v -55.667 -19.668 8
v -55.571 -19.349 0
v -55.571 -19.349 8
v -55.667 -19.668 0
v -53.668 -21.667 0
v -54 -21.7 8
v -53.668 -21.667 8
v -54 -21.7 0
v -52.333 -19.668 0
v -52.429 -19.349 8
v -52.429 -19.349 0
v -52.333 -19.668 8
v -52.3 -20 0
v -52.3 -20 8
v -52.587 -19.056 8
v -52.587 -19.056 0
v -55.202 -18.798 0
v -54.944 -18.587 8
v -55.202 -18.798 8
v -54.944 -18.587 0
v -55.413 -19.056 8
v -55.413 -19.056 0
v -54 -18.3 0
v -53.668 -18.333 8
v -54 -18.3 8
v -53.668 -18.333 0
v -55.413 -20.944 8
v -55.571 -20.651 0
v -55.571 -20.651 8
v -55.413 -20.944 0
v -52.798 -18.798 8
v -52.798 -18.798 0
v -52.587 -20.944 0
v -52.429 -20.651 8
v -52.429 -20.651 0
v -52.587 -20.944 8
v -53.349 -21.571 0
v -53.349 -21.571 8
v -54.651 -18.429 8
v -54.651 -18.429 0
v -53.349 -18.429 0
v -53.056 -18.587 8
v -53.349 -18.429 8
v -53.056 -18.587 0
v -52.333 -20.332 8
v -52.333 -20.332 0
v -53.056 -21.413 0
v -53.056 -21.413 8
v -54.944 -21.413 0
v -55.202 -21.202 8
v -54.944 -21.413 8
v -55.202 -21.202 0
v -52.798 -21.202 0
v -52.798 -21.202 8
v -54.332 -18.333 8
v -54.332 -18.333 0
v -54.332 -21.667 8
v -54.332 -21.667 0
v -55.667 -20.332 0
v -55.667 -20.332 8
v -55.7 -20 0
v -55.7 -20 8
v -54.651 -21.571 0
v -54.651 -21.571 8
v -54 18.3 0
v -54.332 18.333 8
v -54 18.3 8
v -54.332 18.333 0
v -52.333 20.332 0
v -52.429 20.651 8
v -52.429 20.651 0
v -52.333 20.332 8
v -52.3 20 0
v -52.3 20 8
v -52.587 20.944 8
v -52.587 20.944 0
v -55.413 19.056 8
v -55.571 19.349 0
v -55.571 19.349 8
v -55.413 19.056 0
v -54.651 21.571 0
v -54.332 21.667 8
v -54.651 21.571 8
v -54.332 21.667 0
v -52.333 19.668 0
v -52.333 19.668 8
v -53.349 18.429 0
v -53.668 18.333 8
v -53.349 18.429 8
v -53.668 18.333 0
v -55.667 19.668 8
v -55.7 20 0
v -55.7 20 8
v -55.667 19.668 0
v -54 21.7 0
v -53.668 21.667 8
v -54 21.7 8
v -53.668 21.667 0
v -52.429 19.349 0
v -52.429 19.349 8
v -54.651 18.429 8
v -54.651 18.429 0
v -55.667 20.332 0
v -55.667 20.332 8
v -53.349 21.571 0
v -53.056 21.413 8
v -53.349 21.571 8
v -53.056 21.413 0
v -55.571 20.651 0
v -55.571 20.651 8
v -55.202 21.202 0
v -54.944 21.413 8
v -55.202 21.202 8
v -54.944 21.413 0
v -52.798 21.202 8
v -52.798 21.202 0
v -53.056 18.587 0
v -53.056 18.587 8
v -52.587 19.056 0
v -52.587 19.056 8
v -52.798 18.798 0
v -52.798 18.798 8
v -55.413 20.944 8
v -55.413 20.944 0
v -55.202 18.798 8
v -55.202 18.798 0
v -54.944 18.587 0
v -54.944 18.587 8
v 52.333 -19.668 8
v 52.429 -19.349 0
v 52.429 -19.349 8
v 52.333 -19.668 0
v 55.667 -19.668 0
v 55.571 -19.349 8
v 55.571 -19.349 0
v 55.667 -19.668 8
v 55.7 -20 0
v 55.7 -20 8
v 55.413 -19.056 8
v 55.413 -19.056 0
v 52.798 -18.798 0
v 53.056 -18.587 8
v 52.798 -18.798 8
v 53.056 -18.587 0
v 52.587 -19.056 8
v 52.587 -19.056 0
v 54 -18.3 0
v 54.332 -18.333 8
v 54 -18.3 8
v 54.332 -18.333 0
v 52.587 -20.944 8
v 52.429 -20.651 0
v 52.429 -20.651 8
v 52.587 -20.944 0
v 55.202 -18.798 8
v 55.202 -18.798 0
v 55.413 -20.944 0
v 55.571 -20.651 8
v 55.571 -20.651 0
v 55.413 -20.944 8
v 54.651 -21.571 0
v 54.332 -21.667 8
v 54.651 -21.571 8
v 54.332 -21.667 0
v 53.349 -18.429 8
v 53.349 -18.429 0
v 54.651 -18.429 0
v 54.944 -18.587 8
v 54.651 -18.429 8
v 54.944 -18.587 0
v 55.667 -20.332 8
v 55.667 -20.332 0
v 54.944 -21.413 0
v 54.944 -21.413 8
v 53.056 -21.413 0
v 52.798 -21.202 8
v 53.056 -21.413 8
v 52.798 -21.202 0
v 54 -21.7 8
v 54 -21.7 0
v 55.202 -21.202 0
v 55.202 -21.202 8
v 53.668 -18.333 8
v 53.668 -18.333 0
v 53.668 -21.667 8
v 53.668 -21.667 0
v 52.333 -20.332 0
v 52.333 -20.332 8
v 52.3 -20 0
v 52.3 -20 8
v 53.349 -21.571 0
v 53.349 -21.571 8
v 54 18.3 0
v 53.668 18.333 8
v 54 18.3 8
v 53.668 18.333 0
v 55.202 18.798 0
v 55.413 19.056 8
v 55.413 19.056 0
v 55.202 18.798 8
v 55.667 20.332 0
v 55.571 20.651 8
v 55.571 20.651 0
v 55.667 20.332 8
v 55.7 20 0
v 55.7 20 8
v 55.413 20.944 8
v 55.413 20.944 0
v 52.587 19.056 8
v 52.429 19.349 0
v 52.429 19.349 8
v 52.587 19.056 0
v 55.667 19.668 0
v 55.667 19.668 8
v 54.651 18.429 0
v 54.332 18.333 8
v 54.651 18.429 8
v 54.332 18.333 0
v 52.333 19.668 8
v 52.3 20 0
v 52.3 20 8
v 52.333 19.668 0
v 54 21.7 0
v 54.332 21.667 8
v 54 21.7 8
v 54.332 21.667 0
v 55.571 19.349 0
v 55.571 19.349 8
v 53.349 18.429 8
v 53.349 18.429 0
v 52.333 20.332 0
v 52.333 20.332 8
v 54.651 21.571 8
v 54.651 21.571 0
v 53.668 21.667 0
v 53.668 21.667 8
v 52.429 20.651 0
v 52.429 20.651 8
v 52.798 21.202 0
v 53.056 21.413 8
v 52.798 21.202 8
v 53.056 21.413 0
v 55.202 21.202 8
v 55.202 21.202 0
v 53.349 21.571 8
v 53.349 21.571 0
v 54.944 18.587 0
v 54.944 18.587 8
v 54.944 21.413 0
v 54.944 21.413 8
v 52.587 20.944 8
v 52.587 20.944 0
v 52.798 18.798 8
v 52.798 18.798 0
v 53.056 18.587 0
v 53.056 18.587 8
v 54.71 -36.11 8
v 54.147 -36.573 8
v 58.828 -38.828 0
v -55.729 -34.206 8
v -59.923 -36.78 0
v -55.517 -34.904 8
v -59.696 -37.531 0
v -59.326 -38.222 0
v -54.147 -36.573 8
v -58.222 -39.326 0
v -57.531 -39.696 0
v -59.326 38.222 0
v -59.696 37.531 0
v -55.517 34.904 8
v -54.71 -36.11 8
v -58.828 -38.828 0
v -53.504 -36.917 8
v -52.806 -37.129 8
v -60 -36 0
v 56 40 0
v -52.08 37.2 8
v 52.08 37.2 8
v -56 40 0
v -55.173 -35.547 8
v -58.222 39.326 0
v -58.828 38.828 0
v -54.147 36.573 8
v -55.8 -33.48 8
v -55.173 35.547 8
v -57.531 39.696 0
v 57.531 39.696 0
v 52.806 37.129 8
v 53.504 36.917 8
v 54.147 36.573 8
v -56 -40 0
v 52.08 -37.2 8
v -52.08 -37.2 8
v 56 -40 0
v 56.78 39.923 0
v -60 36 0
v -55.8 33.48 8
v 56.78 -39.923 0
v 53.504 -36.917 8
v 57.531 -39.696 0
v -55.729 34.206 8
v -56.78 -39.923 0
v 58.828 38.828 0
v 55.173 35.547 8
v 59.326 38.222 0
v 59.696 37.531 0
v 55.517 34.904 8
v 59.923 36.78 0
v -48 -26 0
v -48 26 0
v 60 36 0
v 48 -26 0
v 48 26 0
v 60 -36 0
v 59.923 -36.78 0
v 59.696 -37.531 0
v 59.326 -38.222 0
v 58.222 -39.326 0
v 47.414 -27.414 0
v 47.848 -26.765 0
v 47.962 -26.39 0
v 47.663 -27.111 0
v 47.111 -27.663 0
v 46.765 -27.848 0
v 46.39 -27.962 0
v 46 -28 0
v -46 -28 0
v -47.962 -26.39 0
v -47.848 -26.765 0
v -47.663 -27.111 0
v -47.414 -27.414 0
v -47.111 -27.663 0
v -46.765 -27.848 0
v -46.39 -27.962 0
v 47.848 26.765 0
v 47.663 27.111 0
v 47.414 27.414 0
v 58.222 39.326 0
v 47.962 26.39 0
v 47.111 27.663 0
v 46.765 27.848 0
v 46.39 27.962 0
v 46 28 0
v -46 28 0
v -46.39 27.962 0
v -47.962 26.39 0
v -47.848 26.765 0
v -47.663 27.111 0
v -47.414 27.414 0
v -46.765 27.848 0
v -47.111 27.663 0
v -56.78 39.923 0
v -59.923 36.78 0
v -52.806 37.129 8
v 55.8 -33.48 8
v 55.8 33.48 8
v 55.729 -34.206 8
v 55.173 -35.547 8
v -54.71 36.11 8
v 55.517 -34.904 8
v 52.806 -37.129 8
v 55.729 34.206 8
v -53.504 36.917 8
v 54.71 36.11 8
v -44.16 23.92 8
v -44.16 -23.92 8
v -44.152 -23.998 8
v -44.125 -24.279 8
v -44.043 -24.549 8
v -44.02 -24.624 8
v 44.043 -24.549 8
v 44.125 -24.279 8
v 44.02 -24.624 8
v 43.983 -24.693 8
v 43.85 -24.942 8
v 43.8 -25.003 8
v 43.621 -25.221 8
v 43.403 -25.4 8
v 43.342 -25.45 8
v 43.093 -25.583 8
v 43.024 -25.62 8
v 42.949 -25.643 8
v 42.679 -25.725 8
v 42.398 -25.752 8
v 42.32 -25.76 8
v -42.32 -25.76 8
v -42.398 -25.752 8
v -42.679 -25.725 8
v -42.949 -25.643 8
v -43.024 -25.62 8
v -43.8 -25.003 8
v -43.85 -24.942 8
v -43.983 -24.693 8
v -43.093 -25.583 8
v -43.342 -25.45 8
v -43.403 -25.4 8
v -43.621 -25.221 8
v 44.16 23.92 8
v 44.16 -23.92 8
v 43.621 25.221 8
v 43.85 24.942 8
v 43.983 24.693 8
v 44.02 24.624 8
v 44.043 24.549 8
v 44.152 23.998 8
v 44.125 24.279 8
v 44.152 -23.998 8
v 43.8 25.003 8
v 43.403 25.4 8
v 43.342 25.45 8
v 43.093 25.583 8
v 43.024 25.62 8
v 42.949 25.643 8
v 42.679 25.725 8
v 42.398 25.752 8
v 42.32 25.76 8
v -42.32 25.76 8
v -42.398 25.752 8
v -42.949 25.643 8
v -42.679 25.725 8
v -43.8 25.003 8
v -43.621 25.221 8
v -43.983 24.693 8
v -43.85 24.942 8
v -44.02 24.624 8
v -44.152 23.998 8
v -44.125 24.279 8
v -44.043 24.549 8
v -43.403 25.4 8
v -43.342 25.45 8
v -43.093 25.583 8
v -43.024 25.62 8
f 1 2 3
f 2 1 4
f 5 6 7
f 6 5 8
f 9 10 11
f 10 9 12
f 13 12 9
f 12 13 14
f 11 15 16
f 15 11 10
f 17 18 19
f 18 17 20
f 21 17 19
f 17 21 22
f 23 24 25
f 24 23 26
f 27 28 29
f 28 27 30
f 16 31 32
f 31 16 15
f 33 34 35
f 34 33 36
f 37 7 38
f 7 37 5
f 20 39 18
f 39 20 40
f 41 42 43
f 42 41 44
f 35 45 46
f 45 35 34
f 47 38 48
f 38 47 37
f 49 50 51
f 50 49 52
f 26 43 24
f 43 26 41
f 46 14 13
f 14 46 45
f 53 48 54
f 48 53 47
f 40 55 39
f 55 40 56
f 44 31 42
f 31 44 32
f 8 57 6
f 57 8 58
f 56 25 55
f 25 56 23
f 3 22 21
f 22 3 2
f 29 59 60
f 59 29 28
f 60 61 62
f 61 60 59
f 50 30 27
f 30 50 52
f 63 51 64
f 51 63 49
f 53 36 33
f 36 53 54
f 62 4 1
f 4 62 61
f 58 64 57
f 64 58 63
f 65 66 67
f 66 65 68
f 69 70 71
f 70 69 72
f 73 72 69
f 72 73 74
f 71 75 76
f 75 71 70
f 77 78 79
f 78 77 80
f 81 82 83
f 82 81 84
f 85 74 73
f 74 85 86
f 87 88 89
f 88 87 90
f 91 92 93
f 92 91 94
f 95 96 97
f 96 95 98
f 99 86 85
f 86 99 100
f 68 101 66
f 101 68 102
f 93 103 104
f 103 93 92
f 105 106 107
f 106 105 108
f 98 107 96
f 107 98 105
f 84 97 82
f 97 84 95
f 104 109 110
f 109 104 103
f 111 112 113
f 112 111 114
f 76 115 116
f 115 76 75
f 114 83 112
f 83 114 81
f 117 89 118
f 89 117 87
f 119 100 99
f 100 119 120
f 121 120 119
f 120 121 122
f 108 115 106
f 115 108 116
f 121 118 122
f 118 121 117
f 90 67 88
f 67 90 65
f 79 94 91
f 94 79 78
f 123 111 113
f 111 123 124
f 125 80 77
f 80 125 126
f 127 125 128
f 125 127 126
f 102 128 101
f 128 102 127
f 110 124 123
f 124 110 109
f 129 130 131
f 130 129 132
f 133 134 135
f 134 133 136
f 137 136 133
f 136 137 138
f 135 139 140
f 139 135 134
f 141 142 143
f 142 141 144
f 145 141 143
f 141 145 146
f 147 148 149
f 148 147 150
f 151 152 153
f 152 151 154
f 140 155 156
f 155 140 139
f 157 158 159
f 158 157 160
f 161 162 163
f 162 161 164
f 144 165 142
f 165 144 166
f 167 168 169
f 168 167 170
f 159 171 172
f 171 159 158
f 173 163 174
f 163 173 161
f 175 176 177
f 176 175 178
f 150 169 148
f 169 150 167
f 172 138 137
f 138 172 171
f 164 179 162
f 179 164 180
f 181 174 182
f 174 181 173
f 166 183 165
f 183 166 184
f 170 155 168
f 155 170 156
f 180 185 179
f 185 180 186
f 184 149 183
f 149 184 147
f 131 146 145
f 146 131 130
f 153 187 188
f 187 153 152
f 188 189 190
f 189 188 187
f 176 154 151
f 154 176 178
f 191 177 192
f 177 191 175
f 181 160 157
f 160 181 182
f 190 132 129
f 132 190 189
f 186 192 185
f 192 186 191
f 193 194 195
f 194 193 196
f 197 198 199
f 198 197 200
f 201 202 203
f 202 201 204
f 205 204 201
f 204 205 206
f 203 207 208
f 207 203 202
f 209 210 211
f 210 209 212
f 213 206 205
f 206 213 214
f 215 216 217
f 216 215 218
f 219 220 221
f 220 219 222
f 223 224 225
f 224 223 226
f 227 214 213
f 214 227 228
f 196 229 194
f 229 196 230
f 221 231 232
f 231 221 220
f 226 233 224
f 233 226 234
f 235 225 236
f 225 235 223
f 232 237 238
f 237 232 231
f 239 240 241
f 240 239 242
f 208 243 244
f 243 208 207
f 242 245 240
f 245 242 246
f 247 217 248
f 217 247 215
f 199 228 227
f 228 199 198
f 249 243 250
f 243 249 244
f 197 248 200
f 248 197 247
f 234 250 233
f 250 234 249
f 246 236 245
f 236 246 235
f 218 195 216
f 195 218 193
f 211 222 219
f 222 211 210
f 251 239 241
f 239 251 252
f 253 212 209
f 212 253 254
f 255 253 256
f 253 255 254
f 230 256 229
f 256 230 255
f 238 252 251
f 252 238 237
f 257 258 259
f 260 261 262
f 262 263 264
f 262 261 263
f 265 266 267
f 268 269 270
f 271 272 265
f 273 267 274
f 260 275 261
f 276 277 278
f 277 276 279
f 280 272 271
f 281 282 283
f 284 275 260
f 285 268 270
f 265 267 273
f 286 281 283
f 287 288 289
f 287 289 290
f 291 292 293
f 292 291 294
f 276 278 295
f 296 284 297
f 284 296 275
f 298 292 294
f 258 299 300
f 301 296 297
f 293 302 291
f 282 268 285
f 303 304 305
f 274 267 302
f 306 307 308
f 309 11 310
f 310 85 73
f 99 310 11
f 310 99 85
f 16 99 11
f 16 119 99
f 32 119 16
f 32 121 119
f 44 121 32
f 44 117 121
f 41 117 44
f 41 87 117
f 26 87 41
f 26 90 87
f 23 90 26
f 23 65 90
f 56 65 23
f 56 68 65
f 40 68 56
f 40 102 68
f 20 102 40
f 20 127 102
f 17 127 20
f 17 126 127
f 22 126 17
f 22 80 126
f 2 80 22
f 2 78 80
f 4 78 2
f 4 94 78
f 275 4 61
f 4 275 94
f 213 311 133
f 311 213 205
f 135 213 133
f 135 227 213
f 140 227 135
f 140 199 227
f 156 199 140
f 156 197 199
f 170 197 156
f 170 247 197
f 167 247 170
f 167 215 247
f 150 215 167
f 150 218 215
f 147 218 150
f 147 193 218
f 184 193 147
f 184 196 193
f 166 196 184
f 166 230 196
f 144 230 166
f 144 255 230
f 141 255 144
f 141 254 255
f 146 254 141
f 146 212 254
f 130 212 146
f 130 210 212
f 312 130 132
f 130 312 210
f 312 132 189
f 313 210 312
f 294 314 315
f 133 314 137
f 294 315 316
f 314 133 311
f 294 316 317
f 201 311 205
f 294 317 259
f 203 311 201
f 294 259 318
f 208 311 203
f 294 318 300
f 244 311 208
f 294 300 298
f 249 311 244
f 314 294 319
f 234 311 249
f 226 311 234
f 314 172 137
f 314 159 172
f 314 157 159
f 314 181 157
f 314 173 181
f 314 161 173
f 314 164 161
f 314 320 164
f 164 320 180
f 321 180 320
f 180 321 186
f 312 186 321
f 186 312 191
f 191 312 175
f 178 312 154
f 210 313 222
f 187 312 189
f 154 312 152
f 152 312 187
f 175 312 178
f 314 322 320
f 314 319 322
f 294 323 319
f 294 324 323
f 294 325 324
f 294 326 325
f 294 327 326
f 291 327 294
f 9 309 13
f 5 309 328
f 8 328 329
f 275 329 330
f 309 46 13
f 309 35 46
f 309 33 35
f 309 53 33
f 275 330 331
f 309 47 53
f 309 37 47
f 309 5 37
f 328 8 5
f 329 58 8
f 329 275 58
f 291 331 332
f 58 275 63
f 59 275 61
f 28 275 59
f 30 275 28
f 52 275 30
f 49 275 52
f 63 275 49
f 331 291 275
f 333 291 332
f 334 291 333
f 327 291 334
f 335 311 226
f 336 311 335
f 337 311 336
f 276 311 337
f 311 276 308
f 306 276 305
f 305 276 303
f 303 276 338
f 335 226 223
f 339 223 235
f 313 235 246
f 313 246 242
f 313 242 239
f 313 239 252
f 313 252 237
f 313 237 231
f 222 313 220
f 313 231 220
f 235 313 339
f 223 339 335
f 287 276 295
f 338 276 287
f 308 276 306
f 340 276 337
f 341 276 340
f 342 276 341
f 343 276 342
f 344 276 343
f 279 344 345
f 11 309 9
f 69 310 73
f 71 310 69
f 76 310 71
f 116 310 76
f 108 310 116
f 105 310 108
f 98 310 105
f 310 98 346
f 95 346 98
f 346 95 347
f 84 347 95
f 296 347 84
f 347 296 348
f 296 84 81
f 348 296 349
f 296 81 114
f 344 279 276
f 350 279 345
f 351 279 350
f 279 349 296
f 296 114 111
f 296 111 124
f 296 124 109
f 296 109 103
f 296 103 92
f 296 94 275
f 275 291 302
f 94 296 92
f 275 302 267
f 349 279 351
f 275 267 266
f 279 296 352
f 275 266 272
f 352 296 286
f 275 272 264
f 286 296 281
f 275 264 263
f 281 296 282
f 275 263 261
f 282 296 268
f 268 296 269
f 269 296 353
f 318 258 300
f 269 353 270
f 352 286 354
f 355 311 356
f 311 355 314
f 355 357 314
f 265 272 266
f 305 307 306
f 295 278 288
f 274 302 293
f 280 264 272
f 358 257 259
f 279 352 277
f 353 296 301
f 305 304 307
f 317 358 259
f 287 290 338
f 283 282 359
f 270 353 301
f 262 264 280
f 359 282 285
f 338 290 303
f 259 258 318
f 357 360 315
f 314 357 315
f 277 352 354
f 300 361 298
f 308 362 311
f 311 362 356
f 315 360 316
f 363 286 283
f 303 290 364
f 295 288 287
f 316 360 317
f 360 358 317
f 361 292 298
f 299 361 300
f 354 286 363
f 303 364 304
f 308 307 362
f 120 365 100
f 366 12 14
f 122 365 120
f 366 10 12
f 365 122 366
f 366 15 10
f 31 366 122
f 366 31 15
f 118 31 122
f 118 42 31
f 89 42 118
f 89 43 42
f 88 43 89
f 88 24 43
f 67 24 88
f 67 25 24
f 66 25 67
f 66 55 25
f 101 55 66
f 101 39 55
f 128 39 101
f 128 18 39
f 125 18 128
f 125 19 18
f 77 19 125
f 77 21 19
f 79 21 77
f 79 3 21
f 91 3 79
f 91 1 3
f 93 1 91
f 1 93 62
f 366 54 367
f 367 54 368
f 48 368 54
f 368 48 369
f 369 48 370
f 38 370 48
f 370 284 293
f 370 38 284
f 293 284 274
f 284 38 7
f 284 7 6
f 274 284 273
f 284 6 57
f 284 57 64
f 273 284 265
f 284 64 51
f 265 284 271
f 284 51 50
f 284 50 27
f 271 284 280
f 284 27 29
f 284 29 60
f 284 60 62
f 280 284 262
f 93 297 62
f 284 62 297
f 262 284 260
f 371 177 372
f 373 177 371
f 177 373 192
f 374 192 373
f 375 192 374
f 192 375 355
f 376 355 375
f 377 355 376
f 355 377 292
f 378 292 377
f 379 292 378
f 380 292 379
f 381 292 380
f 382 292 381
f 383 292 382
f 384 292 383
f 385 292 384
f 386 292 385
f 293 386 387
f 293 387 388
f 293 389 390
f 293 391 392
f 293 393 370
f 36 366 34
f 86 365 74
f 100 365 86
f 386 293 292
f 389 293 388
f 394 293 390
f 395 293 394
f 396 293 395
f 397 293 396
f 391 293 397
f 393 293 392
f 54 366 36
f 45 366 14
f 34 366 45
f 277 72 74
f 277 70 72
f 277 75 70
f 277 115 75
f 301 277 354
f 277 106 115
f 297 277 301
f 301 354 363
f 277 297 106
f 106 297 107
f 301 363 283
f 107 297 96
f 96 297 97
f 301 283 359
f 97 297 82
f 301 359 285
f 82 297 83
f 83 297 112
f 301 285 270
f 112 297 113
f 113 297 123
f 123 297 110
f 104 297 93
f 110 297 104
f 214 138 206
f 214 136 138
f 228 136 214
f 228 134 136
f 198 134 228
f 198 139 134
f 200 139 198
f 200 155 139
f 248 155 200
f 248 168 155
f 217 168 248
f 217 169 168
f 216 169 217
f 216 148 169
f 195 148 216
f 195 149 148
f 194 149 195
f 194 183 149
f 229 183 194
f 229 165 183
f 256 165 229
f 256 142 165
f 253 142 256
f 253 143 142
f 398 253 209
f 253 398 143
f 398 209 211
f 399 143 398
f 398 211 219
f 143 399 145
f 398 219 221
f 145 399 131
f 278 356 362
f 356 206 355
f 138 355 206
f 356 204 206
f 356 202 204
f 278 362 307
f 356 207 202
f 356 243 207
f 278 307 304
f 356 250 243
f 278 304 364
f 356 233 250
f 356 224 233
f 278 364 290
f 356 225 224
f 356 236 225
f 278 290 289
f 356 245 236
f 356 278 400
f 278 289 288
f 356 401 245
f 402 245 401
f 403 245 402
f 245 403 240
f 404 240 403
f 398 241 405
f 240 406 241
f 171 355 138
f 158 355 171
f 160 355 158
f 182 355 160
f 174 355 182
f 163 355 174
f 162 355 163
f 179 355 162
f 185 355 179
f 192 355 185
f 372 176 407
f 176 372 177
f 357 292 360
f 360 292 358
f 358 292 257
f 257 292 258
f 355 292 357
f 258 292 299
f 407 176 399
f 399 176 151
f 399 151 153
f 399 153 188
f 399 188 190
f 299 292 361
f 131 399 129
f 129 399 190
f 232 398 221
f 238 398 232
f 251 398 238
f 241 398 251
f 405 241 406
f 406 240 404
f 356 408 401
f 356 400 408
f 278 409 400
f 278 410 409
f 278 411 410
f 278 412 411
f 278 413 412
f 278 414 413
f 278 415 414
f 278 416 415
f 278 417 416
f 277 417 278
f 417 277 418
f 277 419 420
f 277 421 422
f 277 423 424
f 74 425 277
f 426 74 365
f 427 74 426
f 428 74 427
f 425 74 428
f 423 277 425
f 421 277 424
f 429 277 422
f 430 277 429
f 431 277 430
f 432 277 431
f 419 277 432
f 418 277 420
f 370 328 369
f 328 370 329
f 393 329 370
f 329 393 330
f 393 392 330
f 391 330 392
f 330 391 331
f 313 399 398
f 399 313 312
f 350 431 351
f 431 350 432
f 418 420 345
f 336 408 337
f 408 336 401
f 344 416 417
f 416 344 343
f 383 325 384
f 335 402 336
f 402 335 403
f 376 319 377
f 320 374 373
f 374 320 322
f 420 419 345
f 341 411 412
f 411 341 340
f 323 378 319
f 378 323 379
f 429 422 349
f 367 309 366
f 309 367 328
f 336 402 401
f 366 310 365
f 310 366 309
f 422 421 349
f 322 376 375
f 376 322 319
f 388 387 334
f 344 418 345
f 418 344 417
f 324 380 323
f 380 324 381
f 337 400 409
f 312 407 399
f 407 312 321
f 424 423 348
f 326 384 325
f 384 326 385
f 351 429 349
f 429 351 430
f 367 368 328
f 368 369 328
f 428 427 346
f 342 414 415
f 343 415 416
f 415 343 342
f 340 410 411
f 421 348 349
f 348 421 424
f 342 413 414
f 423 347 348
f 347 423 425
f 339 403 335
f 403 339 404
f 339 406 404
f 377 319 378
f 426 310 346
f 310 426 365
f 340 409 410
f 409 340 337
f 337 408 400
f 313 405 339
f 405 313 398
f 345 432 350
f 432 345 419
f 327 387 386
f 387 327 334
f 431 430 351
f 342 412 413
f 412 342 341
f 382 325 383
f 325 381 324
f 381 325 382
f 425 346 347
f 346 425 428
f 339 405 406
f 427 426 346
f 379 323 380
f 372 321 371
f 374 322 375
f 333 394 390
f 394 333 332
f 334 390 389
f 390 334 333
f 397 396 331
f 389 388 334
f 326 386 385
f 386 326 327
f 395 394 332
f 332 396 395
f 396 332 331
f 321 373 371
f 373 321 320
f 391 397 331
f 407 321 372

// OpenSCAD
$fn = 32;

// ----------------------------------------------------------------------
// Display bezel: 120 x 80 mm frame, opening 96x56 mm
// ----------------------------------------------------------------------

// --- parameters (mm) ---
length = 120;             // frame outside length, X
width = 80;               // frame outside width, Y
frame_w = 12;             // frame width
thickness = 8;            // frame thickness
corner_r = 4;             // outside corner radius
chamfer = 0.93;           // outer wall taper
funnel = 0.9;             // inner opening taper
opening_l = 96;           // opening length
opening_w = 56;           // opening width
inner_r = 2;              // opening corner radius
hole_d = 3.4;             // mounting screw clearance
holes_per_side = 2;       // holes per short side
hole_inset = 6;           // hole centre inset from the outside edge

/* rounded-rectangle outlines, generated with loops */
module rounded_ring(l_nom, w_nom, r) {
  hull() {
    for (sx = [-1, 1]) for (sy = [-1, 1])
      translate([sx * (l_nom / 2 - r), sy * (w_nom / 2 - r)]) circle(r = r);
  }
}

difference() {
  /* frame body, drafted so the outer edge is a variable-depth chamfer */
  linear_extrude(height = thickness, scale = chamfer)
    rounded_ring(length, width, corner_r);
  /* viewing opening, drafted the other way for a funnel edge */
  linear_extrude(height = thickness + 2, scale = funnel)
    translate([0, 0, -1]) rounded_ring(opening_l, opening_w, inner_r);
  /* mounting screws through the frame lands */
  for (sx = [-1, 1]) for (i = [1 : holes_per_side])
    translate([sx * (length / 2 - hole_inset),
               (i - (holes_per_side + 1) / 2) * width * 0.5, -1])
      cylinder(h = thickness + 2, d = hole_d);
}
